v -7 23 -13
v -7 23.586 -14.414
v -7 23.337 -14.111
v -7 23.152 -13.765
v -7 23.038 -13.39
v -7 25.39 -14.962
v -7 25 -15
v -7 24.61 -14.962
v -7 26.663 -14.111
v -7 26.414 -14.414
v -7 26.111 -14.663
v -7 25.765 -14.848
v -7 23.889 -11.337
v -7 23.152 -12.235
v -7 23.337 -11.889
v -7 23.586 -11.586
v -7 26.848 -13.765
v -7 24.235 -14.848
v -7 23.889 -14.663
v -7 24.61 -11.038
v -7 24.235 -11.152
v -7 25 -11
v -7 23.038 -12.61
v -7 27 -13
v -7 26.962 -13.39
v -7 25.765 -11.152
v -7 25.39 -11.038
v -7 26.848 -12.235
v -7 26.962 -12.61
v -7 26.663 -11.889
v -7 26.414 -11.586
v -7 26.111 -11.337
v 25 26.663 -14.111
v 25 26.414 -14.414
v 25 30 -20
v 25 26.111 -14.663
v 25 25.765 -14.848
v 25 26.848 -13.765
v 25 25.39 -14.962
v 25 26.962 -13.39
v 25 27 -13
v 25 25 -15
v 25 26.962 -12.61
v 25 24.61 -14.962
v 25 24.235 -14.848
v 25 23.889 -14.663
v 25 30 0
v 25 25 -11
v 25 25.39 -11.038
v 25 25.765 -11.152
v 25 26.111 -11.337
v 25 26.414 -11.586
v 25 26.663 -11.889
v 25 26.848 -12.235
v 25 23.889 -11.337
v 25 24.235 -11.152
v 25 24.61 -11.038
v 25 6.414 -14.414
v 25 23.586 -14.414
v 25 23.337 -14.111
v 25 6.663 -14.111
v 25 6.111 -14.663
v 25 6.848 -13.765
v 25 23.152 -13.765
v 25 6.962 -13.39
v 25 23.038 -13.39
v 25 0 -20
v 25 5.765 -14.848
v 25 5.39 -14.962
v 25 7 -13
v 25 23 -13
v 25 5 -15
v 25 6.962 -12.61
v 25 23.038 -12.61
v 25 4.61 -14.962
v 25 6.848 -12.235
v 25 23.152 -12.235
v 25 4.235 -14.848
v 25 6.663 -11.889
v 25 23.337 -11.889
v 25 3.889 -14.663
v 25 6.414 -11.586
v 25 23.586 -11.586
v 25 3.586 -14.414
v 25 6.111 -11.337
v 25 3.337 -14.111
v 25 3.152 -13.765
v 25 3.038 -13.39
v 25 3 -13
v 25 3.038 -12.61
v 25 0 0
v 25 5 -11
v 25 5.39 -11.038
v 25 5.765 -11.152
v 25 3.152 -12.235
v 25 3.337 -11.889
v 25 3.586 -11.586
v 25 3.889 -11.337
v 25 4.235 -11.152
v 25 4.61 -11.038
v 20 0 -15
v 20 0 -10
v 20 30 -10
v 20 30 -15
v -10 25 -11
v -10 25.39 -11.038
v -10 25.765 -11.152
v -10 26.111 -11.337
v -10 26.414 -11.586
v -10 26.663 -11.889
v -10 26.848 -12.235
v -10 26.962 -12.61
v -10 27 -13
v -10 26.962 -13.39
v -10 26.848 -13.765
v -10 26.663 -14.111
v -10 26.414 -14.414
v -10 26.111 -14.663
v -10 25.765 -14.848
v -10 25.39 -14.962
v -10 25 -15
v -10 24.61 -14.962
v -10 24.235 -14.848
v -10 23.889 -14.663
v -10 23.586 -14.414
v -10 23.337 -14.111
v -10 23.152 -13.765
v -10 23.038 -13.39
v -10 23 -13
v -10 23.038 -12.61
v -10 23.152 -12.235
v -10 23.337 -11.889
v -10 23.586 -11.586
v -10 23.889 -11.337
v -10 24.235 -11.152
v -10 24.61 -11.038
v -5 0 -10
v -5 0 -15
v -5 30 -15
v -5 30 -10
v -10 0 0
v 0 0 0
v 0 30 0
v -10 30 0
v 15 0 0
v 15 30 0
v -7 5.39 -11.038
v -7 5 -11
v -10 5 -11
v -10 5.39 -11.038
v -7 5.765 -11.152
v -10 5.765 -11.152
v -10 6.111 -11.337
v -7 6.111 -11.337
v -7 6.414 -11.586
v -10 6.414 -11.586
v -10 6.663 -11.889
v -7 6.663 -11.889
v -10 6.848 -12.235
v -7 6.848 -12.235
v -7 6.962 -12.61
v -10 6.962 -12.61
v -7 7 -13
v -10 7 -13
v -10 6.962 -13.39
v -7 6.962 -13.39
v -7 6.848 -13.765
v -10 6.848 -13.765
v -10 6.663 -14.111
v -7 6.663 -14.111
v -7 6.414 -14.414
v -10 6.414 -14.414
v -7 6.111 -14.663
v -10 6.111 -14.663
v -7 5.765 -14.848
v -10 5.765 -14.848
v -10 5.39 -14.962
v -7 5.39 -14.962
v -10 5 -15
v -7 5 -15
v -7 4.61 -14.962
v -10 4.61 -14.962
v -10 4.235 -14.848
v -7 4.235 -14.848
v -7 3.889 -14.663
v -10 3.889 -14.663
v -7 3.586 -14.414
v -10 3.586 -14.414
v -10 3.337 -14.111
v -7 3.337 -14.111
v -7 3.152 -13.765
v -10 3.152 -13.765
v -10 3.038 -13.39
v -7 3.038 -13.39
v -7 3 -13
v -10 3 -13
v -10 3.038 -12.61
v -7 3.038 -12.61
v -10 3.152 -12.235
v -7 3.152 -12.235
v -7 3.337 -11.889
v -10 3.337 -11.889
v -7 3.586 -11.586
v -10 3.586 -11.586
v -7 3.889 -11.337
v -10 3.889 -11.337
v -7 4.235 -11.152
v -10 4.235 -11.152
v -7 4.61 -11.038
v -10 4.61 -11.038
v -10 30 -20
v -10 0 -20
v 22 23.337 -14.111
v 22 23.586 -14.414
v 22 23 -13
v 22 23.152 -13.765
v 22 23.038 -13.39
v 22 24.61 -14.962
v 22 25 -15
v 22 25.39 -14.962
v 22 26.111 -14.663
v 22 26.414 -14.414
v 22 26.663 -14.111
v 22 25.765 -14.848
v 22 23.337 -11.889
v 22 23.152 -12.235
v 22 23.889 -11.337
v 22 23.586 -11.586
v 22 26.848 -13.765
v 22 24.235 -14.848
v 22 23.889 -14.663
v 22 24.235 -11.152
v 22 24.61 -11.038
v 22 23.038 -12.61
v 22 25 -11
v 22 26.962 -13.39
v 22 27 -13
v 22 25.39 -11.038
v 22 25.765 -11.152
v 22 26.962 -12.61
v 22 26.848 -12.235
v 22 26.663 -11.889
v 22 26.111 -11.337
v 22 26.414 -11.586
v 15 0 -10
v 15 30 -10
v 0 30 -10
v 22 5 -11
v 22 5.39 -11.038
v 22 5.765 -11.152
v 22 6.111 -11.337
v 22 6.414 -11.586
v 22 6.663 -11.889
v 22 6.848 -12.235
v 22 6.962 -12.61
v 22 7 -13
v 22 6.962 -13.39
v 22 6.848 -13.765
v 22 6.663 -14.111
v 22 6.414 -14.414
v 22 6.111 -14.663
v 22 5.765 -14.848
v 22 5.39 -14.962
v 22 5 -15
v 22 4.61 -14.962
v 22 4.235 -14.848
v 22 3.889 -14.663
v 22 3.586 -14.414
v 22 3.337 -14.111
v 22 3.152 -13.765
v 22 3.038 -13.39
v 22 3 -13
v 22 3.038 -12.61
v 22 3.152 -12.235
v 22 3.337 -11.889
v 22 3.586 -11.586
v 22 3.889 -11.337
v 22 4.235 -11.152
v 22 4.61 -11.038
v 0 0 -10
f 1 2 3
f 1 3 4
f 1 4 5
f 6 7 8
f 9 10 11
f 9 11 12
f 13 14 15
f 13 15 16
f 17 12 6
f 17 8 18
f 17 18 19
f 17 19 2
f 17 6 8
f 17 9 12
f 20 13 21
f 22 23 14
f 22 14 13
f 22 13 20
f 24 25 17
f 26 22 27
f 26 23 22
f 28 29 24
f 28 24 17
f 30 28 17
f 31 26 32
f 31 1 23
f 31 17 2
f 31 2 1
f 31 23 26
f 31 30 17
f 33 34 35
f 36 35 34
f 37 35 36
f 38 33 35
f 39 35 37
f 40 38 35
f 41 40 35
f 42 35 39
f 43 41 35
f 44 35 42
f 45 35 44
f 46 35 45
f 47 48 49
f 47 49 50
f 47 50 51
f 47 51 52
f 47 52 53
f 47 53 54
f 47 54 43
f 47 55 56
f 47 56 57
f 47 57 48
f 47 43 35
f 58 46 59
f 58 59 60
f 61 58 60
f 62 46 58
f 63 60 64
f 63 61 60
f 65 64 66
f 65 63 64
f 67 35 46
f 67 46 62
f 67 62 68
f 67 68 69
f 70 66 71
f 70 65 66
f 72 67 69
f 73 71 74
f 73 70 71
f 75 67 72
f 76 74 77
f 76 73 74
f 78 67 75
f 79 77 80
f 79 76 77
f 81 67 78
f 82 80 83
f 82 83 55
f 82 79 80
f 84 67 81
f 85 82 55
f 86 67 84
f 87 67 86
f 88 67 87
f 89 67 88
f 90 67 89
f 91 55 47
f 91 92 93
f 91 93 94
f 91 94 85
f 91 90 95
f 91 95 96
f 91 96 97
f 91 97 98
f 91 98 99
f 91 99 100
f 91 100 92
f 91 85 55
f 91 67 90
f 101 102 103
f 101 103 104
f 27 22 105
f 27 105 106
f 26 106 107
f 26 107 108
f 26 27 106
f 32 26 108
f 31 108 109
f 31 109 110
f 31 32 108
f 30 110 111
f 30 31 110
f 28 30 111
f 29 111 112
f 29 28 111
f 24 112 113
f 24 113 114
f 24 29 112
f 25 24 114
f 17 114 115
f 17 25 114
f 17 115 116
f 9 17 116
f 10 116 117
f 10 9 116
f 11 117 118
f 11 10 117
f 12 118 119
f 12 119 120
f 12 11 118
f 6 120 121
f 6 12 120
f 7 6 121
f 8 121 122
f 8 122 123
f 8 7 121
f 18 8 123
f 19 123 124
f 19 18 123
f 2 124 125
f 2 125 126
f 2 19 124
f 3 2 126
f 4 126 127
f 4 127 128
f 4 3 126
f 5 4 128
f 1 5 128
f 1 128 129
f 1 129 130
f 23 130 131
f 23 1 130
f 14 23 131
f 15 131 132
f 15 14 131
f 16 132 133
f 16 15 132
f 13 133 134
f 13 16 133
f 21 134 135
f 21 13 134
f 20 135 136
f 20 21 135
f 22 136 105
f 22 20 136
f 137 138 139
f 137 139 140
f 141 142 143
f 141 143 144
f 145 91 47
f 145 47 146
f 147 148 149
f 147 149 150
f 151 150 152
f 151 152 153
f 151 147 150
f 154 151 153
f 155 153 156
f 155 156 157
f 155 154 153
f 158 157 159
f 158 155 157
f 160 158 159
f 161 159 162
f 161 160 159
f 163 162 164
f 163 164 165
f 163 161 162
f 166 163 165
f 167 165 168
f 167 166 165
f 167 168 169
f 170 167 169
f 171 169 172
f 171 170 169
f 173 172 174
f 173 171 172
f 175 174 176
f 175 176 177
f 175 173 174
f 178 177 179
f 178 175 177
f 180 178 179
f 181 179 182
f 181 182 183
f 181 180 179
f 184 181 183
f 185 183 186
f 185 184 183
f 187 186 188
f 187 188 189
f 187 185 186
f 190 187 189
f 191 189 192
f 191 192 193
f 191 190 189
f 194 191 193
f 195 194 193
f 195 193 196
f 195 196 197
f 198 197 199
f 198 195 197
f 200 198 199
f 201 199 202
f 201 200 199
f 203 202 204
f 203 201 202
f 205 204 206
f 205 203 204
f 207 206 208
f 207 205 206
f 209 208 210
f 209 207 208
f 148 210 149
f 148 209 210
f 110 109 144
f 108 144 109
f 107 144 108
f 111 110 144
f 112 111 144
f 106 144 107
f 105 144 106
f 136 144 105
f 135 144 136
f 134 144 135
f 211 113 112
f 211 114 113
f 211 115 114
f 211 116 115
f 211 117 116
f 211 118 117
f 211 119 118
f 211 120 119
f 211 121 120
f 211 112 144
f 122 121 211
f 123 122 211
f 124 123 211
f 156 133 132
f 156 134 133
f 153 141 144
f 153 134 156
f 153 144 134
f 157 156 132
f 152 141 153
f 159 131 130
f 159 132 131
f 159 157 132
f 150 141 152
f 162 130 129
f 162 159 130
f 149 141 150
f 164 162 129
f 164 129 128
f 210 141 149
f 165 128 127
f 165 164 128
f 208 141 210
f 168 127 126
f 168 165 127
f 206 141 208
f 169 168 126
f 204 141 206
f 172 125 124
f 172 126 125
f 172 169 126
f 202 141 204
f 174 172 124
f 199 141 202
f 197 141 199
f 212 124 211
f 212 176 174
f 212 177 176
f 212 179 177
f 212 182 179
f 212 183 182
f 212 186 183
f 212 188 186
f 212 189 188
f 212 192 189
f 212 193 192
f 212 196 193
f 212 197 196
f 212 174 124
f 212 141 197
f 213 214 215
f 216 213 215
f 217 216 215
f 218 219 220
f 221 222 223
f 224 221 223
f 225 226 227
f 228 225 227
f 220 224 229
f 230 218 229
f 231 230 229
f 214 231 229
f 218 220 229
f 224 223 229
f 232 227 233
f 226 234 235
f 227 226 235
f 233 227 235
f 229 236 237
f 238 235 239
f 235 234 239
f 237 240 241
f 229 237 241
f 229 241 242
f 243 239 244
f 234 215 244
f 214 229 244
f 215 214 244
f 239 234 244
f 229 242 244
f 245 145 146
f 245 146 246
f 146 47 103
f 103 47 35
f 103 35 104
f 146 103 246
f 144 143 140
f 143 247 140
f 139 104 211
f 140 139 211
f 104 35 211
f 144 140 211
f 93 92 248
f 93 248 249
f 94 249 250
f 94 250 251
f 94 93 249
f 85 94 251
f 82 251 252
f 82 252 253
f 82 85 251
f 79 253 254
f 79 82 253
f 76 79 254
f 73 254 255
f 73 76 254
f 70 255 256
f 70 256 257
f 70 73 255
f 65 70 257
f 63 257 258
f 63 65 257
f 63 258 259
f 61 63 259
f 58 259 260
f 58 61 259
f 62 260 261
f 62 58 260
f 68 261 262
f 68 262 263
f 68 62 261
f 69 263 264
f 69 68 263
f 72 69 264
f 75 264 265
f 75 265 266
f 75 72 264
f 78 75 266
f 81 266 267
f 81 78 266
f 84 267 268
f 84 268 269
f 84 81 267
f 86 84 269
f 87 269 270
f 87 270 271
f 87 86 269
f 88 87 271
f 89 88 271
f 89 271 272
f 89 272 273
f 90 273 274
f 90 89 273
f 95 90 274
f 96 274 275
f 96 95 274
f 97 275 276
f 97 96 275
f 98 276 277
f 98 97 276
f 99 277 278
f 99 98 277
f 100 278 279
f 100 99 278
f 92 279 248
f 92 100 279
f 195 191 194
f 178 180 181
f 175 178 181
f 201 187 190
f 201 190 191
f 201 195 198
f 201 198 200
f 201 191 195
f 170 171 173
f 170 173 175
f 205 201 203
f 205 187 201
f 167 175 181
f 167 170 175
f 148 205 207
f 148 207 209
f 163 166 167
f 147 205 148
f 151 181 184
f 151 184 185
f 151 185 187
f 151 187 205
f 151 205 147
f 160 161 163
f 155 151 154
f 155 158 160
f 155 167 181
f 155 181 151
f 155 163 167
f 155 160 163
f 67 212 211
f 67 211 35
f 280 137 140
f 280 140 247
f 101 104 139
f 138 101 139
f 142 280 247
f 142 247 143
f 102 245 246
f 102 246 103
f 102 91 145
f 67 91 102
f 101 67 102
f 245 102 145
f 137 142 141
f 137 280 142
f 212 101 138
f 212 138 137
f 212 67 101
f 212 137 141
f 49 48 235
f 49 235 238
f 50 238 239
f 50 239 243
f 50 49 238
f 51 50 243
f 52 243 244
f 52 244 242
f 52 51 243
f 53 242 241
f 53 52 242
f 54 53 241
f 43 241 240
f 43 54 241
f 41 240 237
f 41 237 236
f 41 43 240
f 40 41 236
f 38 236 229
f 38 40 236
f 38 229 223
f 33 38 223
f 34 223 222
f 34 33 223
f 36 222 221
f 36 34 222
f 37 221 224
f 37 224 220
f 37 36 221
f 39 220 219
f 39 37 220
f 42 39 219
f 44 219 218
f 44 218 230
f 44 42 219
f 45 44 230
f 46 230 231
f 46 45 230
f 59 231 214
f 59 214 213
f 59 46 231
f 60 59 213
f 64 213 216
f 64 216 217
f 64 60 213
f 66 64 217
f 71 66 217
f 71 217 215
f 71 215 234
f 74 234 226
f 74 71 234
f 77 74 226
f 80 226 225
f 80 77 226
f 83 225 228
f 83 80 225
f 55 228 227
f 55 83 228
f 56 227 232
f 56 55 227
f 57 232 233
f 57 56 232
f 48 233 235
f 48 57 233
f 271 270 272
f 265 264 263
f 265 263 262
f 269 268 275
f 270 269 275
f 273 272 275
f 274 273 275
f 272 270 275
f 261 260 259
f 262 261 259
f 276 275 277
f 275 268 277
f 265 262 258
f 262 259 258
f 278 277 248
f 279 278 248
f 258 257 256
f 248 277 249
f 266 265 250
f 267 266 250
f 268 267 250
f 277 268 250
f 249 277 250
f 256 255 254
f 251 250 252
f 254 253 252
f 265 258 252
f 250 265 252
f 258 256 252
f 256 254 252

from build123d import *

# Parameters (mm, degrees)
BOSS_EXTRUDE1_DEPTH = 30
CUT_EXTRUDE1_START  = -35
SKETCH2_R           = 2
CUT_EXTRUDE1_DEPTH  = 3
CUT_EXTRUDE2_START  = -3
SKETCH3_R           = 2
CUT_EXTRUDE2_DEPTH  = 3


with BuildPart() as part:
    # Sketch1 → Boss-Extrude1 (new body)
    with BuildSketch(Plane(origin=(0, 0, 0), x_dir=(1, 0, 0), z_dir=(0, 1, 0))):
        Polygon((0, 0), (-10, 0), (-10, 20), (25, 20), (25, 0), (15, 0), (15, 10), (20, 10), (20, 15), (-5, 15), (-5, 10), (0, 10), align=None)
    extrude(amount=BOSS_EXTRUDE1_DEPTH)

    # Sketch2 → Cut-Extrude1 (cut)
    with BuildSketch(Plane.ZY.offset(10).offset(CUT_EXTRUDE1_START)):
        with Locations((-13, 25)):
            Circle(SKETCH2_R)
        with Locations((-13, 5)):
            Circle(SKETCH2_R)
    extrude(amount=CUT_EXTRUDE1_DEPTH, mode=Mode.SUBTRACT)

    # Sketch3 → Cut-Extrude2 (cut)
    with BuildSketch(Plane.ZY.offset(10).offset(CUT_EXTRUDE2_START)):
        with Locations((-13, 25)):
            Circle(SKETCH3_R)
        with Locations((-13, 5)):
            Circle(SKETCH3_R)
    extrude(amount=CUT_EXTRUDE2_DEPTH, mode=Mode.SUBTRACT)


solid = part.part
